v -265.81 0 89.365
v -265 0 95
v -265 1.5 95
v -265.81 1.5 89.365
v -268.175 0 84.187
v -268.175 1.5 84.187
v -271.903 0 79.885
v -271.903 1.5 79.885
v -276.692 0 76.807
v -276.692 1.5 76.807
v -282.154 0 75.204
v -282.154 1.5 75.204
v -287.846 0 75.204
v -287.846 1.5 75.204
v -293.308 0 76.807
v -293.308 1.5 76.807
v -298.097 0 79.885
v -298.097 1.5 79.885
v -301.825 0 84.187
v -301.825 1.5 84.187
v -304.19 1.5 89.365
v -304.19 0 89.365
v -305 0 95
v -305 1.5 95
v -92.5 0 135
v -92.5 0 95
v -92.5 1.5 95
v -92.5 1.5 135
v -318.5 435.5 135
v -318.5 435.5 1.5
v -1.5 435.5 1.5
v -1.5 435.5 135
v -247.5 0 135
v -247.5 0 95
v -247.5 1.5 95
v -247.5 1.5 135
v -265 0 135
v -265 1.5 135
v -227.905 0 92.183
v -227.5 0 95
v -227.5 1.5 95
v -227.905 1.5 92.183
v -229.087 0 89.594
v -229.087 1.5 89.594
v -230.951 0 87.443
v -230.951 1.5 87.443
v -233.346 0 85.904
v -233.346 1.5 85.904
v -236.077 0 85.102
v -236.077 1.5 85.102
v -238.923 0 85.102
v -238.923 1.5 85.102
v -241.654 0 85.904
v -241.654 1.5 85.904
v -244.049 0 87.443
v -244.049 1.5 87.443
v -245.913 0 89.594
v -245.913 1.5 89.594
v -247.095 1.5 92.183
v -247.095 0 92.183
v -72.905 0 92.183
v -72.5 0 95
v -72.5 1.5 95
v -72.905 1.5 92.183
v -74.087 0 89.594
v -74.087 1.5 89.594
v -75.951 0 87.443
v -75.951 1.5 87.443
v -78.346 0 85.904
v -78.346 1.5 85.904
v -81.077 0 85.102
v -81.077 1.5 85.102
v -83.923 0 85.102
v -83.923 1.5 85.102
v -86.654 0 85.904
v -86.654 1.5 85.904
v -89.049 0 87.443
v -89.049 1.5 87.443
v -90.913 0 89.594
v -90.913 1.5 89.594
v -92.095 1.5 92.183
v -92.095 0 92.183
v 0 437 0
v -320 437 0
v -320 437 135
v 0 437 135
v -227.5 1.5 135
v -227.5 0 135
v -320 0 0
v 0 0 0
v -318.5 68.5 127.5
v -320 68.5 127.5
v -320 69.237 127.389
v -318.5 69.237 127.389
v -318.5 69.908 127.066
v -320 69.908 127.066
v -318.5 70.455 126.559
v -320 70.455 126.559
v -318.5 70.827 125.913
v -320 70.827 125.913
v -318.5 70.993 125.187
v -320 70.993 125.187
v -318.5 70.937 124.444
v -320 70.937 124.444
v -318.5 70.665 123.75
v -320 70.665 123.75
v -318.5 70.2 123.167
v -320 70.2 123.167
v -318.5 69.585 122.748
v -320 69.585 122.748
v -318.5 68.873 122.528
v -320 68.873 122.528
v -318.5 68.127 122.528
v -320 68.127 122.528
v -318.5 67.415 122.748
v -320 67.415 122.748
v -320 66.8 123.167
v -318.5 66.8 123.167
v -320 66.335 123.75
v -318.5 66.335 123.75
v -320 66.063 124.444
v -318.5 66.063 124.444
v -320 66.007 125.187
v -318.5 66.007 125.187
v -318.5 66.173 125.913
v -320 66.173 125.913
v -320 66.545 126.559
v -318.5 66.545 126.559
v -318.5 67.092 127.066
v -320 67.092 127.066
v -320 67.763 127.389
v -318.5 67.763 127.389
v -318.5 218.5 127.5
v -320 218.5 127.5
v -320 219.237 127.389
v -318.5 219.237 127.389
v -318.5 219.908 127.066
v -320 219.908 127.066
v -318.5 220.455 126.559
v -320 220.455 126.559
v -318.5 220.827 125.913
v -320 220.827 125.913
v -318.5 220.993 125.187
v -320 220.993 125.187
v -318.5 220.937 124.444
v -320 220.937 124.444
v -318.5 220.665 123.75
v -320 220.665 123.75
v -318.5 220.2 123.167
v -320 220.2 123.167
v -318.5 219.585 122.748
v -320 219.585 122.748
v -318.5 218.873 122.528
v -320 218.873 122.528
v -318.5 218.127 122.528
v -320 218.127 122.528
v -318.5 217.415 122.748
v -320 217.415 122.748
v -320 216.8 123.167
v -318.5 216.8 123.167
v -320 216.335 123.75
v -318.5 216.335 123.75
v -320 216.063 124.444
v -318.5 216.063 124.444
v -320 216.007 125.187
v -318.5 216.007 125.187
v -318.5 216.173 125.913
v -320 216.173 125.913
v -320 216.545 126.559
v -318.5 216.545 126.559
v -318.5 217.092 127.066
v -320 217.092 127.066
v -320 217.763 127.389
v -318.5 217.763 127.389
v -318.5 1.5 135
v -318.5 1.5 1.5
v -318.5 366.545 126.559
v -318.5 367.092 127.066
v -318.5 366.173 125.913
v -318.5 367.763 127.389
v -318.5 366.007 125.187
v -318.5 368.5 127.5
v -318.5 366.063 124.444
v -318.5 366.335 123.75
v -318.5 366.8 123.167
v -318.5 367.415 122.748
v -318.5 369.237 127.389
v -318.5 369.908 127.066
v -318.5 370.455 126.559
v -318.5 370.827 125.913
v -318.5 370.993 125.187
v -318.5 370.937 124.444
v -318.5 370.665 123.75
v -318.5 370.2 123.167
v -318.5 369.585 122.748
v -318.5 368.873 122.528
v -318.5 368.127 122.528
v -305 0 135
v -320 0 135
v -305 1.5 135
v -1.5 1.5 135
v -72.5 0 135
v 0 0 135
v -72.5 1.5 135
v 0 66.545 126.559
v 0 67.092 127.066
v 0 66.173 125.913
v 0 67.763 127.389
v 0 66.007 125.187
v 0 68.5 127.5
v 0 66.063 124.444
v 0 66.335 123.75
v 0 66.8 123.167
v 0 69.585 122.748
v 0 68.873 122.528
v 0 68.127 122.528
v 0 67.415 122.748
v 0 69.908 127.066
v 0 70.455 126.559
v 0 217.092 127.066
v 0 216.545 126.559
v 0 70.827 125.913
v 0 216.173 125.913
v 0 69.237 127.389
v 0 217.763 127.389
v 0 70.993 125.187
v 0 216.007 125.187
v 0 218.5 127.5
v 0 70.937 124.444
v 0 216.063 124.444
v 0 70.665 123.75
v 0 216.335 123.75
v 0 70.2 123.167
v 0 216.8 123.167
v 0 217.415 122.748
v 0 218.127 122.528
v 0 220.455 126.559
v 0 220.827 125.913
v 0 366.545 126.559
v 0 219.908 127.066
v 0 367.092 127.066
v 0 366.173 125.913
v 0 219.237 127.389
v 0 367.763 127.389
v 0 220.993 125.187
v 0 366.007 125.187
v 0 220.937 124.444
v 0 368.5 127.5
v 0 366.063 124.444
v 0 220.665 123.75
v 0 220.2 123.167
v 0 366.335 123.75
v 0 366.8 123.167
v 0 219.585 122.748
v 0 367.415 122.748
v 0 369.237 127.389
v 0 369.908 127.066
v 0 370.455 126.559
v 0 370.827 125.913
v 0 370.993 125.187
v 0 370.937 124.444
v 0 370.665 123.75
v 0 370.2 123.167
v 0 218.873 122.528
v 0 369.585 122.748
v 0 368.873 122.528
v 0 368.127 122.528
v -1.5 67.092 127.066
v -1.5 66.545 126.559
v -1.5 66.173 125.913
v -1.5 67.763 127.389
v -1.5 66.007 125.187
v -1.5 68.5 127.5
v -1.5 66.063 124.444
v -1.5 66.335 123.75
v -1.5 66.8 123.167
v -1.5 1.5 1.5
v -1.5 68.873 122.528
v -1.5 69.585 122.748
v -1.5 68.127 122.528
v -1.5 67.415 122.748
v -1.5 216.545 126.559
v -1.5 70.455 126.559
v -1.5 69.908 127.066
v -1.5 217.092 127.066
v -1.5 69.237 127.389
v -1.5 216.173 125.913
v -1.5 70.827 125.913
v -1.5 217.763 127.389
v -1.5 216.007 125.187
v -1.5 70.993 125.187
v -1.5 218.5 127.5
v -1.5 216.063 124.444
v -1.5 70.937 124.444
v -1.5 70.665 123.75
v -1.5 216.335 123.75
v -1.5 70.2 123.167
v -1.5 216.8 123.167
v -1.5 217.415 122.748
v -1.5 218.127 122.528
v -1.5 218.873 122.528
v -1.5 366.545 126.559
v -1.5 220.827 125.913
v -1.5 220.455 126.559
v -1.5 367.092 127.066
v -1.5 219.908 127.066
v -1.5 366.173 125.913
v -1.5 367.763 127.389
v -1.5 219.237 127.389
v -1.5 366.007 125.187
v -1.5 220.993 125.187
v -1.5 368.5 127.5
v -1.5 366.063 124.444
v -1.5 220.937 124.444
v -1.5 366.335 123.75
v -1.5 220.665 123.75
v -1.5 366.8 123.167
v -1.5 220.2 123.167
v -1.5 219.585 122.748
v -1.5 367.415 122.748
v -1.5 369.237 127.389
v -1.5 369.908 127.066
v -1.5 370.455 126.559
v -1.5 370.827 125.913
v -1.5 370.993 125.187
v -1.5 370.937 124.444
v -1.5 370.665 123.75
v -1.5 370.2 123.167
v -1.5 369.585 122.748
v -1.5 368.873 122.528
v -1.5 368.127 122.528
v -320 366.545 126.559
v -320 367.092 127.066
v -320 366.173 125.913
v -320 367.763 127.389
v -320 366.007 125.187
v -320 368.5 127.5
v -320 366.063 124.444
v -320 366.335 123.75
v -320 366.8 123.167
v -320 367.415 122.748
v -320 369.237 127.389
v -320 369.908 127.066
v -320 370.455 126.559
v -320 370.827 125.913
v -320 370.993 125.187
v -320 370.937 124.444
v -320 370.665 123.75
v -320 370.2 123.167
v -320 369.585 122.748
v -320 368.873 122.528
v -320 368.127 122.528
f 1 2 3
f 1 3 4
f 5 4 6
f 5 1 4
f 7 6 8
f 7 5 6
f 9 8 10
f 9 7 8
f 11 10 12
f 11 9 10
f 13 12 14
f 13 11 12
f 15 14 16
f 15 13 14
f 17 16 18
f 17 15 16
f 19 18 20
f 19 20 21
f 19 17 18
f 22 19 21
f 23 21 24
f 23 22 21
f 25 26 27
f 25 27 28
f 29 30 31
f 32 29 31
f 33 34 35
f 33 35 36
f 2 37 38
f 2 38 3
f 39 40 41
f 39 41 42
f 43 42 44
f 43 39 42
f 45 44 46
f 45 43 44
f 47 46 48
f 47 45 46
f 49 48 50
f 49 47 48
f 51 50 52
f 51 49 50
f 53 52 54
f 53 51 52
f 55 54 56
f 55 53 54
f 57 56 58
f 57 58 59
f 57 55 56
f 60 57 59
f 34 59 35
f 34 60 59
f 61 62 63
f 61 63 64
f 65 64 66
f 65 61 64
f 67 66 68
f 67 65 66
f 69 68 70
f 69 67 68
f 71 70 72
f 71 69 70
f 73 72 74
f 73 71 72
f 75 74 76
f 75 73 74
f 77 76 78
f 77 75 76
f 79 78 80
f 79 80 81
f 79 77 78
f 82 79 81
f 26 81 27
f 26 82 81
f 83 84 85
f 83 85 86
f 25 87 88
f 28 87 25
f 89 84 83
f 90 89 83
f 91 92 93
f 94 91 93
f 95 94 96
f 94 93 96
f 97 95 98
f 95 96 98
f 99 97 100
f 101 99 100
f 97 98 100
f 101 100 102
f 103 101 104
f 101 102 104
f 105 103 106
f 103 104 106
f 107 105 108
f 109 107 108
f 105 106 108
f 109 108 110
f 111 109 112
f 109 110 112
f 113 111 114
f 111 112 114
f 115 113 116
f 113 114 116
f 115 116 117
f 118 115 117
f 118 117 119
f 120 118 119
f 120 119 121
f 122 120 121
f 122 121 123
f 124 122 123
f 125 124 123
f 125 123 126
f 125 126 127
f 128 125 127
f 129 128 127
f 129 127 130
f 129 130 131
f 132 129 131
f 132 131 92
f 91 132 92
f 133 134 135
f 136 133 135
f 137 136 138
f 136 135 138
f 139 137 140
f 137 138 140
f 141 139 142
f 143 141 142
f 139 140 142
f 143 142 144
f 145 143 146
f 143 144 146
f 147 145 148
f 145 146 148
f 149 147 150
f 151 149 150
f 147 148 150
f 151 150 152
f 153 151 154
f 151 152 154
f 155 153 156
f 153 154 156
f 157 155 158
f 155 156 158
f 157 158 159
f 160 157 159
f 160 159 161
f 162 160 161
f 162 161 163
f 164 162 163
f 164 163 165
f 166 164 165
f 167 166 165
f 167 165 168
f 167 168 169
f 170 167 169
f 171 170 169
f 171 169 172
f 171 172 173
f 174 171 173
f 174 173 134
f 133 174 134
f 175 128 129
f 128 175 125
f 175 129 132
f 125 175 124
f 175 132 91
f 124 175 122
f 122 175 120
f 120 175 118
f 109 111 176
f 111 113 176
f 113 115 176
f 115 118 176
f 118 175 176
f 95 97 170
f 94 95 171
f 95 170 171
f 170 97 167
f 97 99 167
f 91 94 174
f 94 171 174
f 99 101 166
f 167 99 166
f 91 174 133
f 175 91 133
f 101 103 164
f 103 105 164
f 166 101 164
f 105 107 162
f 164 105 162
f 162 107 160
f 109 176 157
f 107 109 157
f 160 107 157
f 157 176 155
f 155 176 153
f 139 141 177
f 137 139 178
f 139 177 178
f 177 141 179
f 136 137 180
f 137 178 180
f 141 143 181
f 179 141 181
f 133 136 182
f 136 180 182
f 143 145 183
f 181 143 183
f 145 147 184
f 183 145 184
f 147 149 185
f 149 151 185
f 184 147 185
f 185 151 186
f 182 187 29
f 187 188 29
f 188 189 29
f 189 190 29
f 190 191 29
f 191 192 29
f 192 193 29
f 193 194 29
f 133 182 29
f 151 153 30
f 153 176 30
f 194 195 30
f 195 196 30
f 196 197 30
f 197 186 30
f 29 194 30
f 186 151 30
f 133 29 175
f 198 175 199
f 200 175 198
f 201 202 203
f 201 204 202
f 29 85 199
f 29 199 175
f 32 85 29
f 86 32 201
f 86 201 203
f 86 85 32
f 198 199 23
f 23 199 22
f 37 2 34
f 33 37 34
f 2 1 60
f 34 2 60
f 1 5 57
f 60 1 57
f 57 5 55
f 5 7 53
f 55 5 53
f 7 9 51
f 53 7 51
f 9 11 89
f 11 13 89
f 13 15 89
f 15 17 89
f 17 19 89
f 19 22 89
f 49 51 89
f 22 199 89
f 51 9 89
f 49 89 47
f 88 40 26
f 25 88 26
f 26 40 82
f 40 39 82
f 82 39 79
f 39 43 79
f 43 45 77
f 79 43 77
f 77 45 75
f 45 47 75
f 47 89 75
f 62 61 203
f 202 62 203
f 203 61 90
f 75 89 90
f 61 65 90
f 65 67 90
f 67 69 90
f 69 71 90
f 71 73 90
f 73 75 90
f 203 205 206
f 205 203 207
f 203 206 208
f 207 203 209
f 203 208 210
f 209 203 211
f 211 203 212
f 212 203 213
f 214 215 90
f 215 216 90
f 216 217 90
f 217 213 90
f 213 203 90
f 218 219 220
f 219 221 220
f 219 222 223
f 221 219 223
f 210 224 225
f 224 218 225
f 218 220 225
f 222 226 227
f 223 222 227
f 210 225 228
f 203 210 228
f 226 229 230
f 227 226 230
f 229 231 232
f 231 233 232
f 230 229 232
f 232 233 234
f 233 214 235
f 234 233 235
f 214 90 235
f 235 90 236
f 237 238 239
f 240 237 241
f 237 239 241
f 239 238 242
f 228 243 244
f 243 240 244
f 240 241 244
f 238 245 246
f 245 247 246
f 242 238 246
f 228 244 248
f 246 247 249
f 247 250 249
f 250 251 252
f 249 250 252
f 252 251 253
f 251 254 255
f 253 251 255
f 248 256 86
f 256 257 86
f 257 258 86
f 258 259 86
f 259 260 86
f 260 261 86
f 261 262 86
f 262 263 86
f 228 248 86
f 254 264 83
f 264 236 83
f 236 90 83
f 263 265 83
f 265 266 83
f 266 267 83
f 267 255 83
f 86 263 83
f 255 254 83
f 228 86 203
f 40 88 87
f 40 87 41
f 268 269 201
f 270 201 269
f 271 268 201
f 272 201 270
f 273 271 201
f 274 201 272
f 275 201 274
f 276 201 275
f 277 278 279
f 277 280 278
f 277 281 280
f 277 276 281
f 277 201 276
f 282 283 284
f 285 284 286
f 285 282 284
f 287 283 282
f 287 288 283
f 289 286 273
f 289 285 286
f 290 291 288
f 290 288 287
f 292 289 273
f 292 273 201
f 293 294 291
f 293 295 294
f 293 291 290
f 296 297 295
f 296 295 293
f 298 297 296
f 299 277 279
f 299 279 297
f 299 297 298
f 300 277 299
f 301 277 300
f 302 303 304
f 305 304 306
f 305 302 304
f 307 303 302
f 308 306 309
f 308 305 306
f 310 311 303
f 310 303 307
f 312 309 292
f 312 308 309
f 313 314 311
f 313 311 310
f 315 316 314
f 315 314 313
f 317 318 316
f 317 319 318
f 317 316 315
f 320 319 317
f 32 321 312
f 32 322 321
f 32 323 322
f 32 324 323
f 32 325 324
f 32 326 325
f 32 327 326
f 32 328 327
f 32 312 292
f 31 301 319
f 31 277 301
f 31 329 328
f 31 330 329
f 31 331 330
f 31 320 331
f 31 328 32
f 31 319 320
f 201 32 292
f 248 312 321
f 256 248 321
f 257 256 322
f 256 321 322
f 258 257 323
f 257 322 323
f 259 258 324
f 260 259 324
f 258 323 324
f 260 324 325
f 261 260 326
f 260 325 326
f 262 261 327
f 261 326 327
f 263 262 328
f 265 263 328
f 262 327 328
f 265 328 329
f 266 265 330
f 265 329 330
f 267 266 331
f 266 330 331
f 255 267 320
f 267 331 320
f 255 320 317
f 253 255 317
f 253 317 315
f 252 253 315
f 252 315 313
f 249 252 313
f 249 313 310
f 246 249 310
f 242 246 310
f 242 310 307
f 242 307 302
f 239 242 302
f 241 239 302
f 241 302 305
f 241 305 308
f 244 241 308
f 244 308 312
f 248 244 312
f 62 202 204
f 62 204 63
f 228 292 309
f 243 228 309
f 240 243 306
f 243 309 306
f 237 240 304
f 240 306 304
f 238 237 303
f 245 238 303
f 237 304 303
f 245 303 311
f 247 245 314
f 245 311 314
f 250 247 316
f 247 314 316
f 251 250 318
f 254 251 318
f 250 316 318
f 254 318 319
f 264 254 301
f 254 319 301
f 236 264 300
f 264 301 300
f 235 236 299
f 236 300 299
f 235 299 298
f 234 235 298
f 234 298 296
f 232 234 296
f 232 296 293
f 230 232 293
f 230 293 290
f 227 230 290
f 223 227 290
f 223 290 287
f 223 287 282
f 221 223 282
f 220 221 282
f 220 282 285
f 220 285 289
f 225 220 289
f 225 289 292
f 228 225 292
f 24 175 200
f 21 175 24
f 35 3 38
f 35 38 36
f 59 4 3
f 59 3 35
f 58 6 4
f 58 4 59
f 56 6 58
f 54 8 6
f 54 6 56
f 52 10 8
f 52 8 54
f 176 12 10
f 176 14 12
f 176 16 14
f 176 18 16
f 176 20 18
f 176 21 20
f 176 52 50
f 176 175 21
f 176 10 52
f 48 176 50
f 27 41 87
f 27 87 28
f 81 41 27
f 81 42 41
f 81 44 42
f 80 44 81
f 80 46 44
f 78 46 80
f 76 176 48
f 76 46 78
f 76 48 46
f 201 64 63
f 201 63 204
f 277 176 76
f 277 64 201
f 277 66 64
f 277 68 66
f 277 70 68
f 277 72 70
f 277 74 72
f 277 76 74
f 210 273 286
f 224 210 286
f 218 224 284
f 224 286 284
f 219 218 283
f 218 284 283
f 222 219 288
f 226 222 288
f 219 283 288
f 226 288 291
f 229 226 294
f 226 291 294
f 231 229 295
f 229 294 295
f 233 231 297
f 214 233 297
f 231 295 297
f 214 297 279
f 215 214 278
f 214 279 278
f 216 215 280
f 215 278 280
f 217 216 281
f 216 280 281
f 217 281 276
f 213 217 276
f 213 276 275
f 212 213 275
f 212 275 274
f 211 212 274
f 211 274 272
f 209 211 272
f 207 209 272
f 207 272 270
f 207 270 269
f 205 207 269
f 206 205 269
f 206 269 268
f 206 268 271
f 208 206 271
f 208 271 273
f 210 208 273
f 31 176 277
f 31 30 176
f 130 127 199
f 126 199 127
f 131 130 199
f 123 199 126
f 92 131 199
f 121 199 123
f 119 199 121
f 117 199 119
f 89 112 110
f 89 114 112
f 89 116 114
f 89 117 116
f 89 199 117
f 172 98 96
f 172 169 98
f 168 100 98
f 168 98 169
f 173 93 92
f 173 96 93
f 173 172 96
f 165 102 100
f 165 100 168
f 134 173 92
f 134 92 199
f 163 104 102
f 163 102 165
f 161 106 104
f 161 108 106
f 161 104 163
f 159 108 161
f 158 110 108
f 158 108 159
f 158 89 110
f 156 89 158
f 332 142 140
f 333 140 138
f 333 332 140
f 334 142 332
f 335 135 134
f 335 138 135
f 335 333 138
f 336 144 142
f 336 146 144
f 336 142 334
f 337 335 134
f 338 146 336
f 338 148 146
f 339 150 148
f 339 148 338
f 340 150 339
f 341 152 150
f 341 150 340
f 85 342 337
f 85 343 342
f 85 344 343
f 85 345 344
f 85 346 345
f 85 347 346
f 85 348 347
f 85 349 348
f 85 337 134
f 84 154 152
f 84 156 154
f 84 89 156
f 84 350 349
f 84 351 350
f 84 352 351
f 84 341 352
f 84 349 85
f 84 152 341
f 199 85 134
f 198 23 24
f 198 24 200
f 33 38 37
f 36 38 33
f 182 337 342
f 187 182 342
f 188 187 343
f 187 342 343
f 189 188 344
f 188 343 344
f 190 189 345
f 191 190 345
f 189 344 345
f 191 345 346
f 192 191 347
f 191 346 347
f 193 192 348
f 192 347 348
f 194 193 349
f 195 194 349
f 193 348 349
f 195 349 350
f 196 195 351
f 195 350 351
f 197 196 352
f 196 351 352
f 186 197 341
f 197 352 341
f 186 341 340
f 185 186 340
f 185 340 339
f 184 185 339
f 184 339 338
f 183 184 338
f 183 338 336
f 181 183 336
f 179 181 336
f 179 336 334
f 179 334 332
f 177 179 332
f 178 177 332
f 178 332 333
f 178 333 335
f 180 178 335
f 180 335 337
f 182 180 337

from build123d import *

# Parameters (mm, degrees)
CROQUIS1_W              = 320
CROQUIS1_H              = 437
SALIENTE_EXTRUIR1_DEPTH = 1.5
CROQUIS2_W              = 317
CROQUIS2_H              = 434
SALIENTE_EXTRUIR2_DEPTH = 135
CORTAR_EXTRUIR1_DEPTH   = 1.5
CORTAR_EXTRUIR2_DEPTH   = 1.5
CROQUIS6_R              = 2.5
CORTAR_EXTRUIR4_DEPTH   = 320


with BuildPart() as part:
    # Croquis1 → Saliente-Extruir1 (new body)
    with BuildSketch(Plane.XY):
        with Locations((-160, 218.5)):
            Rectangle(CROQUIS1_W, CROQUIS1_H)
    extrude(amount=SALIENTE_EXTRUIR1_DEPTH)

    # Croquis2 → Saliente-Extruir2 (add)
    with BuildSketch(Plane.XY):
        Polygon((0, 436), (0, 437), (-1, 437), (-319, 437), (-320, 437), (-320, 436), (-320, 1), (-320, 0), (-319, 0), (-1, 0), (0, 0), (0, 1), align=None)
        with Locations((-160, 218.5)):
            Rectangle(CROQUIS2_W, CROQUIS2_H, mode=Mode.SUBTRACT)
    extrude(amount=SALIENTE_EXTRUIR2_DEPTH)

    # Croquis3 → Cortar-Extruir1 (cut)
    with BuildSketch(Plane.XZ):
        with BuildLine():
            Line((-247.5, 95), (-247.5, 135))
            Line((-247.5, 135), (-227.5, 135))
            Line((-227.5, 135), (-227.5, 95))
            ThreePointArc((-227.5, 95), (-237.5, 85), (-247.5, 95))
        make_face()
        with BuildLine():
            Line((-92.5, 95), (-92.5, 135))
            Line((-92.5, 135), (-72.5, 135))
            Line((-72.5, 135), (-72.5, 95))
            ThreePointArc((-72.5, 95), (-82.5, 85), (-92.5, 95))
        make_face()
    extrude(amount=-CORTAR_EXTRUIR1_DEPTH, mode=Mode.SUBTRACT)

    # Croquis4 → Cortar-Extruir2 (cut)
    with BuildSketch(Plane.XZ):
        with BuildLine():
            Line((-305, 95), (-305, 135))
            Line((-305, 135), (-265, 135))
            Line((-265, 135), (-265, 95))
            ThreePointArc((-265, 95), (-285, 75), (-305, 95))
        make_face()
    extrude(amount=-CORTAR_EXTRUIR2_DEPTH, mode=Mode.SUBTRACT)

    # Croquis6 → Cortar-Extruir4 (cut)
    with BuildSketch(Plane.ZY.offset(320)):
        with Locations((125, 368.5)):
            Circle(CROQUIS6_R)
        with Locations((125, 68.5)):
            Circle(CROQUIS6_R)
        with Locations((125, 218.5)):
            Circle(CROQUIS6_R)
    extrude(amount=-CORTAR_EXTRUIR4_DEPTH, mode=Mode.SUBTRACT)


solid = part.part
